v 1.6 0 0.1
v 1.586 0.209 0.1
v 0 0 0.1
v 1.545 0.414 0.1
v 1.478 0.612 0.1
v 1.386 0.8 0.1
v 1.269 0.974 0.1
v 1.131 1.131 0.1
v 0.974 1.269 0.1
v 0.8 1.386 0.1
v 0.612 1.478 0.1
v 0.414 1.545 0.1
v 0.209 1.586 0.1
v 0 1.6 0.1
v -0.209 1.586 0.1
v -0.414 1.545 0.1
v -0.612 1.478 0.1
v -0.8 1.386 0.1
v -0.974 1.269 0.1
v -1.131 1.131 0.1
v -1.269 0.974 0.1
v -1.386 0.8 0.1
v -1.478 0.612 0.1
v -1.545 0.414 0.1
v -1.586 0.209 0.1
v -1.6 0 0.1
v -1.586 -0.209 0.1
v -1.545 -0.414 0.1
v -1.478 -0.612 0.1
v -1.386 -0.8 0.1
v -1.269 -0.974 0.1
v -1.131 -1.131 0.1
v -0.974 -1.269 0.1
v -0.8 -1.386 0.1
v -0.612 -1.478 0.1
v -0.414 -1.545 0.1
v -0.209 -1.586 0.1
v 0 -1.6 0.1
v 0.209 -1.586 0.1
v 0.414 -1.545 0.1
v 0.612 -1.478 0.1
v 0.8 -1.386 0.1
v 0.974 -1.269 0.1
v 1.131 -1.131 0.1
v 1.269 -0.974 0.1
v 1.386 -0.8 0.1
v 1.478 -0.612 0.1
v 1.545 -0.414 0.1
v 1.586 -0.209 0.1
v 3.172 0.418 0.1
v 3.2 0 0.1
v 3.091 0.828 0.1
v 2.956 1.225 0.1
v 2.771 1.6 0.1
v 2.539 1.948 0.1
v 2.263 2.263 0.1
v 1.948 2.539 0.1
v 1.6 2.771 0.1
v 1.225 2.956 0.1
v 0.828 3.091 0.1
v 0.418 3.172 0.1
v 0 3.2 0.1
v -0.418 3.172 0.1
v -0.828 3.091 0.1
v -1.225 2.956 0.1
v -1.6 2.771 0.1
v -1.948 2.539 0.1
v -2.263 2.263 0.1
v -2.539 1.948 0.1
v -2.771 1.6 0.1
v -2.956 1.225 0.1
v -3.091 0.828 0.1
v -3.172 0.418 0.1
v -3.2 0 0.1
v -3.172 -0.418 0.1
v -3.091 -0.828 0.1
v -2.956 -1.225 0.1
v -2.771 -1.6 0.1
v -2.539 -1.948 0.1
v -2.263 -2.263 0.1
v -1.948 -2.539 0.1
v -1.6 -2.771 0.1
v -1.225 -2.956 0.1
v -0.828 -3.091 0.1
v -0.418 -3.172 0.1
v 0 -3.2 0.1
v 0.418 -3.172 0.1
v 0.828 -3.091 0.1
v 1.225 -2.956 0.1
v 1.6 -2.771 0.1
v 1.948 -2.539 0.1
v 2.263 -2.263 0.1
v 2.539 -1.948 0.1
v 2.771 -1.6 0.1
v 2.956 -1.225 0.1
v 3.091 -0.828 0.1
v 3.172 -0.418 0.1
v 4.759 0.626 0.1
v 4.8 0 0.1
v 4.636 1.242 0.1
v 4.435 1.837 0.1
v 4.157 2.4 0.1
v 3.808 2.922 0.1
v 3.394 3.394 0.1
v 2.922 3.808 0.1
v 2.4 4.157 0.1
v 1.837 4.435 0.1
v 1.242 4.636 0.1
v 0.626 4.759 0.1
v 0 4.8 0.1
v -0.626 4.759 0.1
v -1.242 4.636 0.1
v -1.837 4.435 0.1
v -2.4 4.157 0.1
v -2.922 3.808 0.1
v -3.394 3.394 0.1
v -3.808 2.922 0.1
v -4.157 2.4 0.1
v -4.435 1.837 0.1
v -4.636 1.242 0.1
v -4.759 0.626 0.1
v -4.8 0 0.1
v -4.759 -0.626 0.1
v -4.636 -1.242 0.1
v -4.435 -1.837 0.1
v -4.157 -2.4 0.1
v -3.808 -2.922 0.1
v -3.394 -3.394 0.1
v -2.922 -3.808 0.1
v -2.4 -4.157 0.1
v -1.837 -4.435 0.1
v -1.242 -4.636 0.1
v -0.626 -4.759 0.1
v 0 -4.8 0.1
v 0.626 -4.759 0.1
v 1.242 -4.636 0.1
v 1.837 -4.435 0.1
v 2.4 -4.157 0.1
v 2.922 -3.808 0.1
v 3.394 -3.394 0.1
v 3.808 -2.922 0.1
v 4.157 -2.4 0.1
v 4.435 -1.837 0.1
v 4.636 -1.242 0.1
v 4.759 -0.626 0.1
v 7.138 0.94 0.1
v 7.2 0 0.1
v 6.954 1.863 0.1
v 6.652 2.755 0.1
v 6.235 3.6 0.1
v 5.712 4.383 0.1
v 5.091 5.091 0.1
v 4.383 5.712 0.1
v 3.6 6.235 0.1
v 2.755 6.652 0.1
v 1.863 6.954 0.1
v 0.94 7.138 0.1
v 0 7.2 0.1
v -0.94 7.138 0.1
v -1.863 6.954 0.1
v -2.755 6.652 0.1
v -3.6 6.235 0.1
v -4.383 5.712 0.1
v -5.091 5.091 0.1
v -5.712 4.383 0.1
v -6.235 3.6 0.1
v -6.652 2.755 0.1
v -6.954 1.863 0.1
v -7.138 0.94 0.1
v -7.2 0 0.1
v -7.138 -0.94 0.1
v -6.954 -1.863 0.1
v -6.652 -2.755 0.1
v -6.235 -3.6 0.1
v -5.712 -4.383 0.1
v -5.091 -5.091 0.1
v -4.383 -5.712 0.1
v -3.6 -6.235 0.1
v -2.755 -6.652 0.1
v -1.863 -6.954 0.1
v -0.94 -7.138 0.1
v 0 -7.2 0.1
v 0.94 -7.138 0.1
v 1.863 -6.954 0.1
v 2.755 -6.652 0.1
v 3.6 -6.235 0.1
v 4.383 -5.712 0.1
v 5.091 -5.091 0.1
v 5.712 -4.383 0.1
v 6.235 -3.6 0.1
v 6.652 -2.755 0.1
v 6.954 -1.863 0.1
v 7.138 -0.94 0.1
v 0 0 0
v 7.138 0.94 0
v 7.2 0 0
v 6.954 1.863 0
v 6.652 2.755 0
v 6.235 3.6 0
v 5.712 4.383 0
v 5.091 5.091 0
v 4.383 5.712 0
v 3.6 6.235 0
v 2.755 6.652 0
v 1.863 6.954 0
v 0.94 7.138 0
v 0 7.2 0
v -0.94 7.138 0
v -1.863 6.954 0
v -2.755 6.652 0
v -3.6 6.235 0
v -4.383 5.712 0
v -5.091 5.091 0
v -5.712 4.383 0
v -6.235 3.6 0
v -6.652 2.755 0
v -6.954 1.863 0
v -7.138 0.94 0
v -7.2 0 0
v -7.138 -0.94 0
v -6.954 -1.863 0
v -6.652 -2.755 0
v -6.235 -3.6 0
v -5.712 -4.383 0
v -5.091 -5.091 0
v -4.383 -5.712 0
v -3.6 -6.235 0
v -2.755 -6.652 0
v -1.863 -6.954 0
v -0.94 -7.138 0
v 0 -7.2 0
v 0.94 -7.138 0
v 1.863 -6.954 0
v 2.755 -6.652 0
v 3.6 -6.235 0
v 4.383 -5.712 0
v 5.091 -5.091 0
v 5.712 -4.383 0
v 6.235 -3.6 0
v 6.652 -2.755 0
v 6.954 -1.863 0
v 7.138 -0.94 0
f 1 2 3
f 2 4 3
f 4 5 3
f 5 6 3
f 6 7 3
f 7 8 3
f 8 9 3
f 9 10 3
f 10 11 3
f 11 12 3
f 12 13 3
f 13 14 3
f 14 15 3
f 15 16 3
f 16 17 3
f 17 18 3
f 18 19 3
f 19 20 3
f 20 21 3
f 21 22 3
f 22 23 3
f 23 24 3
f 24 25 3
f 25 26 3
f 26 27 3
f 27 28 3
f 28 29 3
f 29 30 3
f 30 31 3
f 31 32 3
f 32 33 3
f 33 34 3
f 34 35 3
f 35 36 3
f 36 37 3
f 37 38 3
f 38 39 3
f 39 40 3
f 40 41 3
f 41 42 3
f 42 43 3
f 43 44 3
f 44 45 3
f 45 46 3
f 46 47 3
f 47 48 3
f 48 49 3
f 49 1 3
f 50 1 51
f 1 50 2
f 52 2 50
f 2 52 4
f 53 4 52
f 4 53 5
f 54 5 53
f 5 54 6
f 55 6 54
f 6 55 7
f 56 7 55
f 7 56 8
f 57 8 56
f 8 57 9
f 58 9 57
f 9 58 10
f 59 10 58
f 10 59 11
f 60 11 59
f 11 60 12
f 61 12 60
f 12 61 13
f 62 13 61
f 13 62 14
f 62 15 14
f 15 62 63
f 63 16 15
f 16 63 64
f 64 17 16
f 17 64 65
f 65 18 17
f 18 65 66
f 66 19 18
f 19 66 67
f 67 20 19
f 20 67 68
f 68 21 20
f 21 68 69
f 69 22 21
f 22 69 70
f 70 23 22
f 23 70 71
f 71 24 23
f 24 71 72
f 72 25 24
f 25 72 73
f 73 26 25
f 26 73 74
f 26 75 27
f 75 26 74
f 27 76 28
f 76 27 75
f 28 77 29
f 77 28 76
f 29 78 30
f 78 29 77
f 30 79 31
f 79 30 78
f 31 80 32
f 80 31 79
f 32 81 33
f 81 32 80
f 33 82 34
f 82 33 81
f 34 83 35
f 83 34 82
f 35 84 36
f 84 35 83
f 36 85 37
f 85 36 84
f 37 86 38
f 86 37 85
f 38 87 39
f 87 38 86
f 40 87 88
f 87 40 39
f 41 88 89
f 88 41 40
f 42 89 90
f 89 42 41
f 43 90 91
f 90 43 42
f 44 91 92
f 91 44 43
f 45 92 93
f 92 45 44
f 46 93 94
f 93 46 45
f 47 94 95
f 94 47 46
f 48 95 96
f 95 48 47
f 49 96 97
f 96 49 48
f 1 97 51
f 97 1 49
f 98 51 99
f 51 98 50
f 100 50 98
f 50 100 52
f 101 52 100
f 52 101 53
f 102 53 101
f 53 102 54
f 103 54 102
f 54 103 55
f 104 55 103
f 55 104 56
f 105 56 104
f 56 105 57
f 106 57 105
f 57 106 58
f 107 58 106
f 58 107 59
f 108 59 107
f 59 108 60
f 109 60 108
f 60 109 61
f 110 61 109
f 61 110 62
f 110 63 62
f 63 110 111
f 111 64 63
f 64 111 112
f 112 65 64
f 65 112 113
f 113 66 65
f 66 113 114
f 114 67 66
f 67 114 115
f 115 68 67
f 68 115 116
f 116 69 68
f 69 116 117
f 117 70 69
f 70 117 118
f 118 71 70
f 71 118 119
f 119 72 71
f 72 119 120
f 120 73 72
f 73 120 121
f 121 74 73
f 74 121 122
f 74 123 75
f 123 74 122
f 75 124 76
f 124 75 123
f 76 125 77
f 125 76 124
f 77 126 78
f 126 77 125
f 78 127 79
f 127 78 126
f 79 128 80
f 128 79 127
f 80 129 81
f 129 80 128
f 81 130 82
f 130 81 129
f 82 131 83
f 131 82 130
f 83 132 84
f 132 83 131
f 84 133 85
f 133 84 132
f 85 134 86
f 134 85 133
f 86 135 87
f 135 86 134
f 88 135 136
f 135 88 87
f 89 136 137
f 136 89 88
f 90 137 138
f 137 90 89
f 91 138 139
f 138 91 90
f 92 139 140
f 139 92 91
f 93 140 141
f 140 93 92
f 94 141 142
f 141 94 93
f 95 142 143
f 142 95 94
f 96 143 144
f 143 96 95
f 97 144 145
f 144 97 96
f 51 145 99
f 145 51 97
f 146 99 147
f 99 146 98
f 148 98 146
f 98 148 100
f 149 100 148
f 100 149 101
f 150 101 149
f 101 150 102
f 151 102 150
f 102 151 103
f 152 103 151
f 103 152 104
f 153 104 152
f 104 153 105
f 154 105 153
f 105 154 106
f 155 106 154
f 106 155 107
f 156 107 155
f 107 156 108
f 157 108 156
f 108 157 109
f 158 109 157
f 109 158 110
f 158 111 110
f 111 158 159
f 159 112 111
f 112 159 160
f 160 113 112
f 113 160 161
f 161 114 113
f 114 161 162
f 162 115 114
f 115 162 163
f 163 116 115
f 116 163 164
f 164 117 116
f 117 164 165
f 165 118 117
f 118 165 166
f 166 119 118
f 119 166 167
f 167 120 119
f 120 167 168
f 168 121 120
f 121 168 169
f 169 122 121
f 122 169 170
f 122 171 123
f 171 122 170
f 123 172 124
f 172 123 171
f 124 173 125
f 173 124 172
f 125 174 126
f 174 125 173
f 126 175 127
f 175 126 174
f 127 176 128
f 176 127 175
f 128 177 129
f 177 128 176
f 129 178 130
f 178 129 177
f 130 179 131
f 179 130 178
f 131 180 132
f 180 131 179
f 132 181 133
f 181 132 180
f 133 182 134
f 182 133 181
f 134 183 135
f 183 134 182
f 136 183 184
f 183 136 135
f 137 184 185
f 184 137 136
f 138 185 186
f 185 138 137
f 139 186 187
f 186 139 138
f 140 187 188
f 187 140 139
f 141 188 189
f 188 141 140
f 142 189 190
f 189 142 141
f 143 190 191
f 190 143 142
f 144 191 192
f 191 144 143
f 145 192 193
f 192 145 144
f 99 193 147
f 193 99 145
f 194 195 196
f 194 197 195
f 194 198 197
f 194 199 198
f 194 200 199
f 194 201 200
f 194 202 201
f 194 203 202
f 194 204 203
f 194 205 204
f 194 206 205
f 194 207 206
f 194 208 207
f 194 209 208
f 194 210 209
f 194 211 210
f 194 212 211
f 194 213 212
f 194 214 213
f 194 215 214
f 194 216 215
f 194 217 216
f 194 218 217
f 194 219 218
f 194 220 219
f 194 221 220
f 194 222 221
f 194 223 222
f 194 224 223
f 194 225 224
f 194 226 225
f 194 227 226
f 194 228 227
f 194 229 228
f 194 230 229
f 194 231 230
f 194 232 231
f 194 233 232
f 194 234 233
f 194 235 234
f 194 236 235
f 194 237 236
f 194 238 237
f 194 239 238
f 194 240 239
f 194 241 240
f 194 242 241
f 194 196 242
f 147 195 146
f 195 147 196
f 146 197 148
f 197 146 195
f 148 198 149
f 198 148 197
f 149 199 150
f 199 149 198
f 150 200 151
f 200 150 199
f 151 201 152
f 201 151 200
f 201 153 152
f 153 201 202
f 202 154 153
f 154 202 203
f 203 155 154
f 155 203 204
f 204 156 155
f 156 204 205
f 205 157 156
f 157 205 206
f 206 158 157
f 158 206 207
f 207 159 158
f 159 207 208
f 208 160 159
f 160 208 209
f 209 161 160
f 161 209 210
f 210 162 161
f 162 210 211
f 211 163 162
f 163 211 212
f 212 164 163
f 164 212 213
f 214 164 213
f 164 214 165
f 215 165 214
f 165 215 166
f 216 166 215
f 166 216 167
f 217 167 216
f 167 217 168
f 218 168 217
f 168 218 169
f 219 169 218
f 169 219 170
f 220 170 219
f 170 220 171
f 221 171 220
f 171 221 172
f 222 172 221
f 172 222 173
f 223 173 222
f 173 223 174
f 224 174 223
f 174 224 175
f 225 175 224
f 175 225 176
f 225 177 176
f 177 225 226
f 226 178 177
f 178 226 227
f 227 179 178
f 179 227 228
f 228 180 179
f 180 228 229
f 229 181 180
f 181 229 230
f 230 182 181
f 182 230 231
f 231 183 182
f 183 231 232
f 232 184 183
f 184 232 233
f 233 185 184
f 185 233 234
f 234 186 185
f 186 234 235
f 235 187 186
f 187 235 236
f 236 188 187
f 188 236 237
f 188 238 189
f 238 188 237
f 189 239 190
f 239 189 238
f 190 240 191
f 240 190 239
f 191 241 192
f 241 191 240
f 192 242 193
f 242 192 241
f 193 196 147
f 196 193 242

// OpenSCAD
// file: ../p/48/1-4cyli.scad
use <../../lib.scad>
function ldraw_lib__48__1_4cyli() = [
// 0 Hi-Res Cylinder 0.25
// 0 Name: 48\1-4cyli.dat
// 0 Author: Manfred Moolhuysen
// 0 !LDRAW_ORG 48_Primitive UPDATE 2009-01
// 0 !LICENSE Licensed under CC BY 2.0 and CC BY 4.0 : see CAreadme.txt
// 
// 0 BFC CERTIFY CCW
  [0,"BFC","CERTIFY"],
  [0,"BFC","CCW"],
// 
// 0 !HISTORY 1999-07-05 [PTadmin] Official Update 1999-05
// 0 !HISTORY 2002-02-28 [hafhead] Added BFC statement
// 0 !HISTORY 2002-04-25 [PTadmin] Official Update 2002-02
// 0 !HISTORY 2007-06-24 [PTadmin] Header formatted for Contributor Agreement
// 0 !HISTORY 2008-07-01 [PTadmin] Official Update 2008-01
// 0 !HISTORY 2008-07-07 [guyvivan] Made BFC'ed CCW (2005-12-06)
// 0 !HISTORY 2009-05-02 [PTadmin] Official Update 2009-01
// 
// 
// 4 16 0.9914 0 0.1305 1 0 0 1 1 0 0.9914 1 0.1305
  [4,16,0.9914,0,0.1305,1,0,0,1,1,0,0.9914,1,0.1305],
// 4 16 0.9659 0 0.2588 0.9914 0 0.1305 0.9914 1 0.1305 0.9659 1 0.2588
  [4,16,0.9659,0,0.2588,0.9914,0,0.1305,0.9914,1,0.1305,0.9659,1,0.2588],
// 4 16 0.9239 0 0.3827 0.9659 0 0.2588 0.9659 1 0.2588 0.9239 1 0.3827
  [4,16,0.9239,0,0.3827,0.9659,0,0.2588,0.9659,1,0.2588,0.9239,1,0.3827],
// 4 16 0.866 0 0.5 0.9239 0 0.3827 0.9239 1 0.3827 0.866 1 0.5
  [4,16,0.866,0,0.5,0.9239,0,0.3827,0.9239,1,0.3827,0.866,1,0.5],
// 4 16 0.7934 0 0.6088 0.866 0 0.5 0.866 1 0.5 0.7934 1 0.6088
  [4,16,0.7934,0,0.6088,0.866,0,0.5,0.866,1,0.5,0.7934,1,0.6088],
// 4 16 0.7071 0 0.7071 0.7934 0 0.6088 0.7934 1 0.6088 0.7071 1 0.7071
  [4,16,0.7071,0,0.7071,0.7934,0,0.6088,0.7934,1,0.6088,0.7071,1,0.7071],
// 4 16 0.6088 0 0.7934 0.7071 0 0.7071 0.7071 1 0.7071 0.6088 1 0.7934
  [4,16,0.6088,0,0.7934,0.7071,0,0.7071,0.7071,1,0.7071,0.6088,1,0.7934],
// 4 16 0.5 0 0.866 0.6088 0 0.7934 0.6088 1 0.7934 0.5 1 0.866
  [4,16,0.5,0,0.866,0.6088,0,0.7934,0.6088,1,0.7934,0.5,1,0.866],
// 4 16 0.3827 0 0.9239 0.5 0 0.866 0.5 1 0.866 0.3827 1 0.9239
  [4,16,0.3827,0,0.9239,0.5,0,0.866,0.5,1,0.866,0.3827,1,0.9239],
// 4 16 0.2588 0 0.9659 0.3827 0 0.9239 0.3827 1 0.9239 0.2588 1 0.9659
  [4,16,0.2588,0,0.9659,0.3827,0,0.9239,0.3827,1,0.9239,0.2588,1,0.9659],
// 4 16 0.1305 0 0.9914 0.2588 0 0.9659 0.2588 1 0.9659 0.1305 1 0.9914
  [4,16,0.1305,0,0.9914,0.2588,0,0.9659,0.2588,1,0.9659,0.1305,1,0.9914],
// 4 16 0 0 1 0.1305 0 0.9914 0.1305 1 0.9914 0 1 1
  [4,16,0,0,1,0.1305,0,0.9914,0.1305,1,0.9914,0,1,1],
// 
// 0 conditional lines
// 5 24 1 1 0 1 0 0 1 1 -1 0.9914 1 0.1305
  [5,24,1,1,0,1,0,0,1,1,-1,0.9914,1,0.1305],
// 5 24 0.9914 1 0.1305 0.9914 0 0.1305 1 1 0 0.9659 1 0.2588
  [5,24,0.9914,1,0.1305,0.9914,0,0.1305,1,1,0,0.9659,1,0.2588],
// 5 24 0.9659 1 0.2588 0.9659 0 0.2588 0.9914 1 0.1305 0.9239 1 0.3827
  [5,24,0.9659,1,0.2588,0.9659,0,0.2588,0.9914,1,0.1305,0.9239,1,0.3827],
// 5 24 0.9239 1 0.3827 0.9239 0 0.3827 0.9659 1 0.2588 0.866 1 0.5
  [5,24,0.9239,1,0.3827,0.9239,0,0.3827,0.9659,1,0.2588,0.866,1,0.5],
// 5 24 0.866 1 0.5 0.866 0 0.5 0.9239 1 0.3827 0.7934 1 0.6088
  [5,24,0.866,1,0.5,0.866,0,0.5,0.9239,1,0.3827,0.7934,1,0.6088],
// 5 24 0.7934 1 0.6088 0.7934 0 0.6088 0.866 1 0.5 0.7071 1 0.7071
  [5,24,0.7934,1,0.6088,0.7934,0,0.6088,0.866,1,0.5,0.7071,1,0.7071],
// 5 24 0.7071 1 0.7071 0.7071 0 0.7071 0.7934 1 0.6088 0.6088 1 0.7934
  [5,24,0.7071,1,0.7071,0.7071,0,0.7071,0.7934,1,0.6088,0.6088,1,0.7934],
// 5 24 0.6088 1 0.7934 0.6088 0 0.7934 0.7071 1 0.7071 0.5 1 0.866
  [5,24,0.6088,1,0.7934,0.6088,0,0.7934,0.7071,1,0.7071,0.5,1,0.866],
// 5 24 0.5 1 0.866 0.5 0 0.866 0.6088 1 0.7934 0.3827 1 0.9239
  [5,24,0.5,1,0.866,0.5,0,0.866,0.6088,1,0.7934,0.3827,1,0.9239],
// 5 24 0.3827 1 0.9239 0.3827 0 0.9239 0.5 1 0.866 0.2588 1 0.9659
  [5,24,0.3827,1,0.9239,0.3827,0,0.9239,0.5,1,0.866,0.2588,1,0.9659],
// 5 24 0.2588 1 0.9659 0.2588 0 0.9659 0.3827 1 0.9239 0.1305 1 0.9914
  [5,24,0.2588,1,0.9659,0.2588,0,0.9659,0.3827,1,0.9239,0.1305,1,0.9914],
// 5 24 0.1305 1 0.9914 0.1305 0 0.9914 0.2588 1 0.9659 0 1 1
  [5,24,0.1305,1,0.9914,0.1305,0,0.9914,0.2588,1,0.9659,0,1,1],
// 5 24 0 1 1 0 0 1 0.1305 1 0.9914 -1 1 1
  [5,24,0,1,1,0,0,1,0.1305,1,0.9914,-1,1,1],
// 
// 0 end of file
];
module ldraw_lib__48__1_4cyli(step=0, col=false, unit=2/5, alt=false, line=0.2, solid=!$preview)
    makepoly(ldraw_lib__48__1_4cyli(), step=step, col=col, unit=unit, alt=alt, line=line, solid=solid);
ldraw_lib__48__1_4cyli(line=0.2);
// file: ../p/48/4-4cyli.scad
use <../../lib.scad>
use <1-4cyli.scad>
function ldraw_lib__48__4_4cyli() = [
// 0 Hi-Res Cylinder 1.0
// 0 Name: 48\4-4cyli.dat
// 0 Author: Paul Easter [pneaster]
// 0 !LDRAW_ORG 48_Primitive UPDATE 2012-02
// 0 !LICENSE Licensed under CC BY 4.0 : see CAreadme.txt
// 
// 0 BFC CERTIFY CCW
  [0,"BFC","CERTIFY"],
  [0,"BFC","CCW"],
// 
// 0 !HISTORY 2002-08-18 [PTadmin] Official Update 2002-04
// 0 !HISTORY 2007-06-24 [PTadmin] Header formatted for Contributor Agreement
// 0 !HISTORY 2008-07-01 [PTadmin] Official Update 2008-01
// 0 !HISTORY 2012-02-27 [Philo] Changed to CCW
// 0 !HISTORY 2012-08-09 [PTadmin] Official Update 2012-02
// 
// 
// 1 16 0 0 0 1 0 0 0 1 0 0 0 1 48\1-4cyli.dat
  [1,16,0,0,0,1,0,0,0,1,0,0,0,1, ldraw_lib__48__1_4cyli()],
// 1 16 0 0 0 0 0 -1 0 1 0 1 0 0 48\1-4cyli.dat
  [1,16,0,0,0,0,0,-1,0,1,0,1,0,0, ldraw_lib__48__1_4cyli()],
// 1 16 0 0 0 -1 0 0 0 1 0 0 0 -1 48\1-4cyli.dat
  [1,16,0,0,0,-1,0,0,0,1,0,0,0,-1, ldraw_lib__48__1_4cyli()],
// 1 16 0 0 0 0 0 1 0 1 0 -1 0 0 48\1-4cyli.dat
  [1,16,0,0,0,0,0,1,0,1,0,-1,0,0, ldraw_lib__48__1_4cyli()],
];
module ldraw_lib__48__4_4cyli(step=0, col=false, unit=2/5, alt=false, line=0.2, solid=!$preview)
    makepoly(ldraw_lib__48__4_4cyli(), step=step, col=col, unit=unit, alt=alt, line=line, solid=solid);
ldraw_lib__48__4_4cyli(line=0.2);
// file: ../p/48/4-4ring2.scad
use <../../lib.scad>
function ldraw_lib__48__4_4ring2() = [
// 0 Hi-Res Ring  2 x 1.0
// 0 Name: 48\4-4ring2.dat
// 0 Author: Niels Bugge [SirBugge]
// 0 !LDRAW_ORG 48_Primitive UPDATE 2012-02
// 0 !LICENSE Licensed under CC BY 2.0 and CC BY 4.0 : see CAreadme.txt
// 
// 0 BFC CERTIFY CCW
  [0,"BFC","CERTIFY"],
  [0,"BFC","CCW"],
// 
// 0 !HISTORY 2009-05-02 [PTadmin] Official Update 2009-01
// 0 !HISTORY 2012-02-27 [Philo] Changed to CCW
// 0 !HISTORY 2012-08-09 [PTadmin] Official Update 2012-02
// 
// 
// 4 16 3 0 0 2.9742 0 0.3915 1.9828 0 0.261 2 0 0
  [4,16,3,0,0,2.9742,0,0.3915,1.9828,0,0.261,2,0,0],
// 4 16 2.9742 0 0.3915 2.8977 0 0.7764 1.9318 0 0.5176 1.9828 0 0.261
  [4,16,2.9742,0,0.3915,2.8977,0,0.7764,1.9318,0,0.5176,1.9828,0,0.261],
// 4 16 2.8977 0 0.7764 2.7717 0 1.1481 1.8478 0 0.7654 1.9318 0 0.5176
  [4,16,2.8977,0,0.7764,2.7717,0,1.1481,1.8478,0,0.7654,1.9318,0,0.5176],
// 4 16 2.7717 0 1.1481 2.598 0 1.5 1.732 0 1 1.8478 0 0.7654
  [4,16,2.7717,0,1.1481,2.598,0,1.5,1.732,0,1,1.8478,0,0.7654],
// 4 16 2.598 0 1.5 2.3802 0 1.8264 1.5868 0 1.2176 1.732 0 1
  [4,16,2.598,0,1.5,2.3802,0,1.8264,1.5868,0,1.2176,1.732,0,1],
// 4 16 2.3802 0 1.8264 2.1213 0 2.1213 1.4142 0 1.4142 1.5868 0 1.2176
  [4,16,2.3802,0,1.8264,2.1213,0,2.1213,1.4142,0,1.4142,1.5868,0,1.2176],
// 4 16 2.1213 0 2.1213 1.8264 0 2.3802 1.2176 0 1.5868 1.4142 0 1.4142
  [4,16,2.1213,0,2.1213,1.8264,0,2.3802,1.2176,0,1.5868,1.4142,0,1.4142],
// 4 16 1.8264 0 2.3802 1.5 0 2.598 1 0 1.732 1.2176 0 1.5868
  [4,16,1.8264,0,2.3802,1.5,0,2.598,1,0,1.732,1.2176,0,1.5868],
// 4 16 1.5 0 2.598 1.1481 0 2.7717 0.7654 0 1.8478 1 0 1.732
  [4,16,1.5,0,2.598,1.1481,0,2.7717,0.7654,0,1.8478,1,0,1.732],
// 4 16 1.1481 0 2.7717 0.7764 0 2.8977 0.5176 0 1.9318 0.7654 0 1.8478
  [4,16,1.1481,0,2.7717,0.7764,0,2.8977,0.5176,0,1.9318,0.7654,0,1.8478],
// 4 16 0.7764 0 2.8977 0.3915 0 2.9742 0.261 0 1.9828 0.5176 0 1.9318
  [4,16,0.7764,0,2.8977,0.3915,0,2.9742,0.261,0,1.9828,0.5176,0,1.9318],
// 4 16 0.3915 0 2.9742 0 0 3 0 0 2 0.261 0 1.9828
  [4,16,0.3915,0,2.9742,0,0,3,0,0,2,0.261,0,1.9828],
// 4 16 0 0 3 -0.3915 0 2.9742 -0.261 0 1.9828 0 0 2
  [4,16,0,0,3,-0.3915,0,2.9742,-0.261,0,1.9828,0,0,2],
// 4 16 -0.3915 0 2.9742 -0.7764 0 2.8977 -0.5176 0 1.9318 -0.261 0 1.9828
  [4,16,-0.3915,0,2.9742,-0.7764,0,2.8977,-0.5176,0,1.9318,-0.261,0,1.9828],
// 4 16 -0.7764 0 2.8977 -1.1481 0 2.7717 -0.7654 0 1.8478 -0.5176 0 1.9318
  [4,16,-0.7764,0,2.8977,-1.1481,0,2.7717,-0.7654,0,1.8478,-0.5176,0,1.9318],
// 4 16 -1.1481 0 2.7717 -1.5 0 2.598 -1 0 1.732 -0.7654 0 1.8478
  [4,16,-1.1481,0,2.7717,-1.5,0,2.598,-1,0,1.732,-0.7654,0,1.8478],
// 4 16 -1.5 0 2.598 -1.8264 0 2.3802 -1.2176 0 1.5868 -1 0 1.732
  [4,16,-1.5,0,2.598,-1.8264,0,2.3802,-1.2176,0,1.5868,-1,0,1.732],
// 4 16 -1.8264 0 2.3802 -2.1213 0 2.1213 -1.4142 0 1.4142 -1.2176 0 1.5868
  [4,16,-1.8264,0,2.3802,-2.1213,0,2.1213,-1.4142,0,1.4142,-1.2176,0,1.5868],
// 4 16 -2.1213 0 2.1213 -2.3802 0 1.8264 -1.5868 0 1.2176 -1.4142 0 1.4142
  [4,16,-2.1213,0,2.1213,-2.3802,0,1.8264,-1.5868,0,1.2176,-1.4142,0,1.4142],
// 4 16 -2.3802 0 1.8264 -2.598 0 1.5 -1.732 0 1 -1.5868 0 1.2176
  [4,16,-2.3802,0,1.8264,-2.598,0,1.5,-1.732,0,1,-1.5868,0,1.2176],
// 4 16 -2.598 0 1.5 -2.7717 0 1.1481 -1.8478 0 0.7654 -1.732 0 1
  [4,16,-2.598,0,1.5,-2.7717,0,1.1481,-1.8478,0,0.7654,-1.732,0,1],
// 4 16 -2.7717 0 1.1481 -2.8977 0 0.7764 -1.9318 0 0.5176 -1.8478 0 0.7654
  [4,16,-2.7717,0,1.1481,-2.8977,0,0.7764,-1.9318,0,0.5176,-1.8478,0,0.7654],
// 4 16 -2.8977 0 0.7764 -2.9742 0 0.3915 -1.9828 0 0.261 -1.9318 0 0.5176
  [4,16,-2.8977,0,0.7764,-2.9742,0,0.3915,-1.9828,0,0.261,-1.9318,0,0.5176],
// 4 16 -2.9742 0 0.3915 -3 0 0 -2 0 0 -1.9828 0 0.261
  [4,16,-2.9742,0,0.3915,-3,0,0,-2,0,0,-1.9828,0,0.261],
// 4 16 -3 0 0 -2.9742 0 -0.3915 -1.9828 0 -0.261 -2 0 0
  [4,16,-3,0,0,-2.9742,0,-0.3915,-1.9828,0,-0.261,-2,0,0],
// 4 16 -2.9742 0 -0.3915 -2.8977 0 -0.7764 -1.9318 0 -0.5176 -1.9828 0 -0.261
  [4,16,-2.9742,0,-0.3915,-2.8977,0,-0.7764,-1.9318,0,-0.5176,-1.9828,0,-0.261],
// 4 16 -2.8977 0 -0.7764 -2.7717 0 -1.1481 -1.8478 0 -0.7654 -1.9318 0 -0.5176
  [4,16,-2.8977,0,-0.7764,-2.7717,0,-1.1481,-1.8478,0,-0.7654,-1.9318,0,-0.5176],
// 4 16 -2.7717 0 -1.1481 -2.598 0 -1.5 -1.732 0 -1 -1.8478 0 -0.7654
  [4,16,-2.7717,0,-1.1481,-2.598,0,-1.5,-1.732,0,-1,-1.8478,0,-0.7654],
// 4 16 -2.598 0 -1.5 -2.3802 0 -1.8264 -1.5868 0 -1.2176 -1.732 0 -1
  [4,16,-2.598,0,-1.5,-2.3802,0,-1.8264,-1.5868,0,-1.2176,-1.732,0,-1],
// 4 16 -2.3802 0 -1.8264 -2.1213 0 -2.1213 -1.4142 0 -1.4142 -1.5868 0 -1.2176
  [4,16,-2.3802,0,-1.8264,-2.1213,0,-2.1213,-1.4142,0,-1.4142,-1.5868,0,-1.2176],
// 4 16 -2.1213 0 -2.1213 -1.8264 0 -2.3802 -1.2176 0 -1.5868 -1.4142 0 -1.4142
  [4,16,-2.1213,0,-2.1213,-1.8264,0,-2.3802,-1.2176,0,-1.5868,-1.4142,0,-1.4142],
// 4 16 -1.8264 0 -2.3802 -1.5 0 -2.598 -1 0 -1.732 -1.2176 0 -1.5868
  [4,16,-1.8264,0,-2.3802,-1.5,0,-2.598,-1,0,-1.732,-1.2176,0,-1.5868],
// 4 16 -1.5 0 -2.598 -1.1481 0 -2.7717 -0.7654 0 -1.8478 -1 0 -1.732
  [4,16,-1.5,0,-2.598,-1.1481,0,-2.7717,-0.7654,0,-1.8478,-1,0,-1.732],
// 4 16 -1.1481 0 -2.7717 -0.7764 0 -2.8977 -0.5176 0 -1.9318 -0.7654 0 -1.8478
  [4,16,-1.1481,0,-2.7717,-0.7764,0,-2.8977,-0.5176,0,-1.9318,-0.7654,0,-1.8478],
// 4 16 -0.7764 0 -2.8977 -0.3915 0 -2.9742 -0.261 0 -1.9828 -0.5176 0 -1.9318
  [4,16,-0.7764,0,-2.8977,-0.3915,0,-2.9742,-0.261,0,-1.9828,-0.5176,0,-1.9318],
// 4 16 -0.3915 0 -2.9742 0 0 -3 0 0 -2 -0.261 0 -1.9828
  [4,16,-0.3915,0,-2.9742,0,0,-3,0,0,-2,-0.261,0,-1.9828],
// 4 16 0 0 -3 0.3915 0 -2.9742 0.261 0 -1.9828 0 0 -2
  [4,16,0,0,-3,0.3915,0,-2.9742,0.261,0,-1.9828,0,0,-2],
// 4 16 0.3915 0 -2.9742 0.7764 0 -2.8977 0.5176 0 -1.9318 0.261 0 -1.9828
  [4,16,0.3915,0,-2.9742,0.7764,0,-2.8977,0.5176,0,-1.9318,0.261,0,-1.9828],
// 4 16 0.7764 0 -2.8977 1.1481 0 -2.7717 0.7654 0 -1.8478 0.5176 0 -1.9318
  [4,16,0.7764,0,-2.8977,1.1481,0,-2.7717,0.7654,0,-1.8478,0.5176,0,-1.9318],
// 4 16 1.1481 0 -2.7717 1.5 0 -2.598 1 0 -1.732 0.7654 0 -1.8478
  [4,16,1.1481,0,-2.7717,1.5,0,-2.598,1,0,-1.732,0.7654,0,-1.8478],
// 4 16 1.5 0 -2.598 1.8264 0 -2.3802 1.2176 0 -1.5868 1 0 -1.732
  [4,16,1.5,0,-2.598,1.8264,0,-2.3802,1.2176,0,-1.5868,1,0,-1.732],
// 4 16 1.8264 0 -2.3802 2.1213 0 -2.1213 1.4142 0 -1.4142 1.2176 0 -1.5868
  [4,16,1.8264,0,-2.3802,2.1213,0,-2.1213,1.4142,0,-1.4142,1.2176,0,-1.5868],
// 4 16 2.1213 0 -2.1213 2.3802 0 -1.8264 1.5868 0 -1.2176 1.4142 0 -1.4142
  [4,16,2.1213,0,-2.1213,2.3802,0,-1.8264,1.5868,0,-1.2176,1.4142,0,-1.4142],
// 4 16 2.3802 0 -1.8264 2.598 0 -1.5 1.732 0 -1 1.5868 0 -1.2176
  [4,16,2.3802,0,-1.8264,2.598,0,-1.5,1.732,0,-1,1.5868,0,-1.2176],
// 4 16 2.598 0 -1.5 2.7717 0 -1.1481 1.8478 0 -0.7654 1.732 0 -1
  [4,16,2.598,0,-1.5,2.7717,0,-1.1481,1.8478,0,-0.7654,1.732,0,-1],
// 4 16 2.7717 0 -1.1481 2.8977 0 -0.7764 1.9318 0 -0.5176 1.8478 0 -0.7654
  [4,16,2.7717,0,-1.1481,2.8977,0,-0.7764,1.9318,0,-0.5176,1.8478,0,-0.7654],
// 4 16 2.8977 0 -0.7764 2.9742 0 -0.3915 1.9828 0 -0.261 1.9318 0 -0.5176
  [4,16,2.8977,0,-0.7764,2.9742,0,-0.3915,1.9828,0,-0.261,1.9318,0,-0.5176],
// 4 16 2.9742 0 -0.3915 3 0 0 2 0 0 1.9828 0 -0.261
  [4,16,2.9742,0,-0.3915,3,0,0,2,0,0,1.9828,0,-0.261],
];
module ldraw_lib__48__4_4ring2(step=0, col=false, unit=2/5, alt=false, line=0.2, solid=!$preview)
    makepoly(ldraw_lib__48__4_4ring2(), step=step, col=col, unit=unit, alt=alt, line=line, solid=solid);
ldraw_lib__48__4_4ring2(line=0.2);
// file: ../p/48/4-4ring1.scad
use <../../lib.scad>
function ldraw_lib__48__4_4ring1() = [
// 0 Hi-Res Ring  1 x 1.0
// 0 Name: 48\4-4ring1.dat
// 0 Author: Mark Kennedy [mkennedy]
// 0 !LDRAW_ORG 48_Primitive UPDATE 2012-02
// 0 !LICENSE Licensed under CC BY 4.0 : see CAreadme.txt
// 
// 0 BFC CERTIFY CCW
  [0,"BFC","CERTIFY"],
  [0,"BFC","CCW"],
// 
// 0 !HISTORY 2003-12-19 [PTadmin] Official Update 2003-03
// 0 !HISTORY 2007-06-24 [PTadmin] Header formatted for Contributor Agreement
// 0 !HISTORY 2008-07-01 [PTadmin] Official Update 2008-01
// 0 !HISTORY 2012-02-27 [Philo] Changed to CCW
// 0 !HISTORY 2012-08-09 [PTadmin] Official Update 2012-02
// 
// 
// 4 16 2 0 0 1.9828 0 0.261 0.9914 0 0.1305 1 0 0
  [4,16,2,0,0,1.9828,0,0.261,0.9914,0,0.1305,1,0,0],
// 4 16 1.9828 0 0.261 1.9318 0 0.5176 0.9659 0 0.2588 0.9914 0 0.1305
  [4,16,1.9828,0,0.261,1.9318,0,0.5176,0.9659,0,0.2588,0.9914,0,0.1305],
// 4 16 1.9318 0 0.5176 1.8478 0 0.7654 0.9239 0 0.3827 0.9659 0 0.2588
  [4,16,1.9318,0,0.5176,1.8478,0,0.7654,0.9239,0,0.3827,0.9659,0,0.2588],
// 4 16 1.8478 0 0.7654 1.732 0 1 0.866 0 0.5 0.9239 0 0.3827
  [4,16,1.8478,0,0.7654,1.732,0,1,0.866,0,0.5,0.9239,0,0.3827],
// 4 16 1.732 0 1 1.5868 0 1.2176 0.7934 0 0.6088 0.866 0 0.5
  [4,16,1.732,0,1,1.5868,0,1.2176,0.7934,0,0.6088,0.866,0,0.5],
// 4 16 1.5868 0 1.2176 1.4142 0 1.4142 0.7071 0 0.7071 0.7934 0 0.6088
  [4,16,1.5868,0,1.2176,1.4142,0,1.4142,0.7071,0,0.7071,0.7934,0,0.6088],
// 4 16 1.4142 0 1.4142 1.2176 0 1.5868 0.6088 0 0.7934 0.7071 0 0.7071
  [4,16,1.4142,0,1.4142,1.2176,0,1.5868,0.6088,0,0.7934,0.7071,0,0.7071],
// 4 16 1.2176 0 1.5868 1 0 1.732 0.5 0 0.866 0.6088 0 0.7934
  [4,16,1.2176,0,1.5868,1,0,1.732,0.5,0,0.866,0.6088,0,0.7934],
// 4 16 1 0 1.732 0.7654 0 1.8478 0.3827 0 0.9239 0.5 0 0.866
  [4,16,1,0,1.732,0.7654,0,1.8478,0.3827,0,0.9239,0.5,0,0.866],
// 4 16 0.7654 0 1.8478 0.5176 0 1.9318 0.2588 0 0.9659 0.3827 0 0.9239
  [4,16,0.7654,0,1.8478,0.5176,0,1.9318,0.2588,0,0.9659,0.3827,0,0.9239],
// 4 16 0.5176 0 1.9318 0.261 0 1.9828 0.1305 0 0.9914 0.2588 0 0.9659
  [4,16,0.5176,0,1.9318,0.261,0,1.9828,0.1305,0,0.9914,0.2588,0,0.9659],
// 4 16 0.261 0 1.9828 0 0 2 0 0 1 0.1305 0 0.9914
  [4,16,0.261,0,1.9828,0,0,2,0,0,1,0.1305,0,0.9914],
// 
// 4 16 0 0 2 -0.261 0 1.9828 -0.1305 0 0.9914 0 0 1
  [4,16,0,0,2,-0.261,0,1.9828,-0.1305,0,0.9914,0,0,1],
// 4 16 -0.261 0 1.9828 -0.5176 0 1.9318 -0.2588 0 0.9659 -0.1305 0 0.9914
  [4,16,-0.261,0,1.9828,-0.5176,0,1.9318,-0.2588,0,0.9659,-0.1305,0,0.9914],
// 4 16 -0.5176 0 1.9318 -0.7654 0 1.8478 -0.3827 0 0.9239 -0.2588 0 0.9659
  [4,16,-0.5176,0,1.9318,-0.7654,0,1.8478,-0.3827,0,0.9239,-0.2588,0,0.9659],
// 4 16 -0.7654 0 1.8478 -1 0 1.732 -0.5 0 0.866 -0.3827 0 0.9239
  [4,16,-0.7654,0,1.8478,-1,0,1.732,-0.5,0,0.866,-0.3827,0,0.9239],
// 4 16 -1 0 1.732 -1.2176 0 1.5868 -0.6088 0 0.7934 -0.5 0 0.866
  [4,16,-1,0,1.732,-1.2176,0,1.5868,-0.6088,0,0.7934,-0.5,0,0.866],
// 4 16 -1.2176 0 1.5868 -1.4142 0 1.4142 -0.7071 0 0.7071 -0.6088 0 0.7934
  [4,16,-1.2176,0,1.5868,-1.4142,0,1.4142,-0.7071,0,0.7071,-0.6088,0,0.7934],
// 4 16 -1.4142 0 1.4142 -1.5868 0 1.2176 -0.7934 0 0.6088 -0.7071 0 0.7071
  [4,16,-1.4142,0,1.4142,-1.5868,0,1.2176,-0.7934,0,0.6088,-0.7071,0,0.7071],
// 4 16 -1.5868 0 1.2176 -1.732 0 1 -0.866 0 0.5 -0.7934 0 0.6088
  [4,16,-1.5868,0,1.2176,-1.732,0,1,-0.866,0,0.5,-0.7934,0,0.6088],
// 4 16 -1.732 0 1 -1.8478 0 0.7654 -0.9239 0 0.3827 -0.866 0 0.5
  [4,16,-1.732,0,1,-1.8478,0,0.7654,-0.9239,0,0.3827,-0.866,0,0.5],
// 4 16 -1.8478 0 0.7654 -1.9318 0 0.5176 -0.9659 0 0.2588 -0.9239 0 0.3827
  [4,16,-1.8478,0,0.7654,-1.9318,0,0.5176,-0.9659,0,0.2588,-0.9239,0,0.3827],
// 4 16 -1.9318 0 0.5176 -1.9828 0 0.261 -0.9914 0 0.1305 -0.9659 0 0.2588
  [4,16,-1.9318,0,0.5176,-1.9828,0,0.261,-0.9914,0,0.1305,-0.9659,0,0.2588],
// 4 16 -1.9828 0 0.261 -2 0 0 -1 0 0 -0.9914 0 0.1305
  [4,16,-1.9828,0,0.261,-2,0,0,-1,0,0,-0.9914,0,0.1305],
// 
// 4 16 -2 0 0 -1.9828 0 -0.261 -0.9914 0 -0.1305 -1 0 0
  [4,16,-2,0,0,-1.9828,0,-0.261,-0.9914,0,-0.1305,-1,0,0],
// 4 16 -1.9828 0 -0.261 -1.9318 0 -0.5176 -0.9659 0 -0.2588 -0.9914 0 -0.1305
  [4,16,-1.9828,0,-0.261,-1.9318,0,-0.5176,-0.9659,0,-0.2588,-0.9914,0,-0.1305],
// 4 16 -1.9318 0 -0.5176 -1.8478 0 -0.7654 -0.9239 0 -0.3827 -0.9659 0 -0.2588
  [4,16,-1.9318,0,-0.5176,-1.8478,0,-0.7654,-0.9239,0,-0.3827,-0.9659,0,-0.2588],
// 4 16 -1.8478 0 -0.7654 -1.732 0 -1 -0.866 0 -0.5 -0.9239 0 -0.3827
  [4,16,-1.8478,0,-0.7654,-1.732,0,-1,-0.866,0,-0.5,-0.9239,0,-0.3827],
// 4 16 -1.732 0 -1 -1.5868 0 -1.2176 -0.7934 0 -0.6088 -0.866 0 -0.5
  [4,16,-1.732,0,-1,-1.5868,0,-1.2176,-0.7934,0,-0.6088,-0.866,0,-0.5],
// 4 16 -1.5868 0 -1.2176 -1.4142 0 -1.4142 -0.7071 0 -0.7071 -0.7934 0 -0.6088
  [4,16,-1.5868,0,-1.2176,-1.4142,0,-1.4142,-0.7071,0,-0.7071,-0.7934,0,-0.6088],
// 4 16 -1.4142 0 -1.4142 -1.2176 0 -1.5868 -0.6088 0 -0.7934 -0.7071 0 -0.7071
  [4,16,-1.4142,0,-1.4142,-1.2176,0,-1.5868,-0.6088,0,-0.7934,-0.7071,0,-0.7071],
// 4 16 -1.2176 0 -1.5868 -1 0 -1.732 -0.5 0 -0.866 -0.6088 0 -0.7934
  [4,16,-1.2176,0,-1.5868,-1,0,-1.732,-0.5,0,-0.866,-0.6088,0,-0.7934],
// 4 16 -1 0 -1.732 -0.7654 0 -1.8478 -0.3827 0 -0.9239 -0.5 0 -0.866
  [4,16,-1,0,-1.732,-0.7654,0,-1.8478,-0.3827,0,-0.9239,-0.5,0,-0.866],
// 4 16 -0.7654 0 -1.8478 -0.5176 0 -1.9318 -0.2588 0 -0.9659 -0.3827 0 -0.9239
  [4,16,-0.7654,0,-1.8478,-0.5176,0,-1.9318,-0.2588,0,-0.9659,-0.3827,0,-0.9239],
// 4 16 -0.5176 0 -1.9318 -0.261 0 -1.9828 -0.1305 0 -0.9914 -0.2588 0 -0.9659
  [4,16,-0.5176,0,-1.9318,-0.261,0,-1.9828,-0.1305,0,-0.9914,-0.2588,0,-0.9659],
// 4 16 -0.261 0 -1.9828 0 0 -2 0 0 -1 -0.1305 0 -0.9914
  [4,16,-0.261,0,-1.9828,0,0,-2,0,0,-1,-0.1305,0,-0.9914],
// 
// 4 16 0 0 -2 0.261 0 -1.9828 0.1305 0 -0.9914 0 0 -1
  [4,16,0,0,-2,0.261,0,-1.9828,0.1305,0,-0.9914,0,0,-1],
// 4 16 0.261 0 -1.9828 0.5176 0 -1.9318 0.2588 0 -0.9659 0.1305 0 -0.9914
  [4,16,0.261,0,-1.9828,0.5176,0,-1.9318,0.2588,0,-0.9659,0.1305,0,-0.9914],
// 4 16 0.5176 0 -1.9318 0.7654 0 -1.8478 0.3827 0 -0.9239 0.2588 0 -0.9659
  [4,16,0.5176,0,-1.9318,0.7654,0,-1.8478,0.3827,0,-0.9239,0.2588,0,-0.9659],
// 4 16 0.7654 0 -1.8478 1 0 -1.732 0.5 0 -0.866 0.3827 0 -0.9239
  [4,16,0.7654,0,-1.8478,1,0,-1.732,0.5,0,-0.866,0.3827,0,-0.9239],
// 4 16 1 0 -1.732 1.2176 0 -1.5868 0.6088 0 -0.7934 0.5 0 -0.866
  [4,16,1,0,-1.732,1.2176,0,-1.5868,0.6088,0,-0.7934,0.5,0,-0.866],
// 4 16 1.2176 0 -1.5868 1.4142 0 -1.4142 0.7071 0 -0.7071 0.6088 0 -0.7934
  [4,16,1.2176,0,-1.5868,1.4142,0,-1.4142,0.7071,0,-0.7071,0.6088,0,-0.7934],
// 4 16 1.4142 0 -1.4142 1.5868 0 -1.2176 0.7934 0 -0.6088 0.7071 0 -0.7071
  [4,16,1.4142,0,-1.4142,1.5868,0,-1.2176,0.7934,0,-0.6088,0.7071,0,-0.7071],
// 4 16 1.5868 0 -1.2176 1.732 0 -1 0.866 0 -0.5 0.7934 0 -0.6088
  [4,16,1.5868,0,-1.2176,1.732,0,-1,0.866,0,-0.5,0.7934,0,-0.6088],
// 4 16 1.732 0 -1 1.8478 0 -0.7654 0.9239 0 -0.3827 0.866 0 -0.5
  [4,16,1.732,0,-1,1.8478,0,-0.7654,0.9239,0,-0.3827,0.866,0,-0.5],
// 4 16 1.8478 0 -0.7654 1.9318 0 -0.5176 0.9659 0 -0.2588 0.9239 0 -0.3827
  [4,16,1.8478,0,-0.7654,1.9318,0,-0.5176,0.9659,0,-0.2588,0.9239,0,-0.3827],
// 4 16 1.9318 0 -0.5176 1.9828 0 -0.261 0.9914 0 -0.1305 0.9659 0 -0.2588
  [4,16,1.9318,0,-0.5176,1.9828,0,-0.261,0.9914,0,-0.1305,0.9659,0,-0.2588],
// 4 16 1.9828 0 -0.261 2 0 0 1 0 0 0.9914 0 -0.1305
  [4,16,1.9828,0,-0.261,2,0,0,1,0,0,0.9914,0,-0.1305],
];
module ldraw_lib__48__4_4ring1(step=0, col=false, unit=2/5, alt=false, line=0.2, solid=!$preview)
    makepoly(ldraw_lib__48__4_4ring1(), step=step, col=col, unit=unit, alt=alt, line=line, solid=solid);
ldraw_lib__48__4_4ring1(line=0.2);
// file: ../p/48/4-4disc.scad
use <../../lib.scad>
function ldraw_lib__48__4_4disc() = [
// 0 Hi-Res Disc 1.0
// 0 Name: 48\4-4disc.dat
// 0 Author: Miklos Hosszu [hmick]
// 0 !LDRAW_ORG 48_Primitive UPDATE 2012-02
// 0 !LICENSE Licensed under CC BY 2.0 and CC BY 4.0 : see CAreadme.txt
// 
// 0 BFC CERTIFY CCW
  [0,"BFC","CERTIFY"],
  [0,"BFC","CCW"],
// 
// 0 !HISTORY 2004-11-06 [PTadmin] Official Update 2004-04
// 0 !HISTORY 2007-06-24 [PTadmin] Header formatted for Contributor Agreement
// 0 !HISTORY 2008-07-01 [PTadmin] Official Update 2008-01
// 0 !HISTORY 2012-02-27 [Philo] Changed to CCW
// 0 !HISTORY 2012-08-09 [PTadmin] Official Update 2012-02
// 
// 
// 3 16 1 0 0 0.9914 0 0.1305 0 0 0
  [3,16,1,0,0,0.9914,0,0.1305,0,0,0],
// 3 16 0.9914 0 0.1305 0.9659 0 0.2588 0 0 0
  [3,16,0.9914,0,0.1305,0.9659,0,0.2588,0,0,0],
// 3 16 0.9659 0 0.2588 0.9239 0 0.3827 0 0 0
  [3,16,0.9659,0,0.2588,0.9239,0,0.3827,0,0,0],
// 3 16 0.9239 0 0.3827 0.866 0 0.5 0 0 0
  [3,16,0.9239,0,0.3827,0.866,0,0.5,0,0,0],
// 3 16 0.866 0 0.5 0.7934 0 0.6088 0 0 0
  [3,16,0.866,0,0.5,0.7934,0,0.6088,0,0,0],
// 3 16 0.7934 0 0.6088 0.7071 0 0.7071 0 0 0
  [3,16,0.7934,0,0.6088,0.7071,0,0.7071,0,0,0],
// 3 16 0.7071 0 0.7071 0.6088 0 0.7934 0 0 0
  [3,16,0.7071,0,0.7071,0.6088,0,0.7934,0,0,0],
// 3 16 0.6088 0 0.7934 0.5 0 0.866 0 0 0
  [3,16,0.6088,0,0.7934,0.5,0,0.866,0,0,0],
// 3 16 0.5 0 0.866 0.3827 0 0.9239 0 0 0
  [3,16,0.5,0,0.866,0.3827,0,0.9239,0,0,0],
// 3 16 0.3827 0 0.9239 0.2588 0 0.9659 0 0 0
  [3,16,0.3827,0,0.9239,0.2588,0,0.9659,0,0,0],
// 3 16 0.2588 0 0.9659 0.1305 0 0.9914 0 0 0
  [3,16,0.2588,0,0.9659,0.1305,0,0.9914,0,0,0],
// 3 16 0.1305 0 0.9914 0 0 1 0 0 0
  [3,16,0.1305,0,0.9914,0,0,1,0,0,0],
// 3 16 0 0 1 -0.1305 0 0.9914 0 0 0
  [3,16,0,0,1,-0.1305,0,0.9914,0,0,0],
// 3 16 -0.1305 0 0.9914 -0.2588 0 0.9659 0 0 0
  [3,16,-0.1305,0,0.9914,-0.2588,0,0.9659,0,0,0],
// 3 16 -0.2588 0 0.9659 -0.3827 0 0.9239 0 0 0
  [3,16,-0.2588,0,0.9659,-0.3827,0,0.9239,0,0,0],
// 3 16 -0.3827 0 0.9239 -0.5 0 0.866 0 0 0
  [3,16,-0.3827,0,0.9239,-0.5,0,0.866,0,0,0],
// 3 16 -0.5 0 0.866 -0.6088 0 0.7934 0 0 0
  [3,16,-0.5,0,0.866,-0.6088,0,0.7934,0,0,0],
// 3 16 -0.6088 0 0.7934 -0.7071 0 0.7071 0 0 0
  [3,16,-0.6088,0,0.7934,-0.7071,0,0.7071,0,0,0],
// 3 16 -0.7071 0 0.7071 -0.7934 0 0.6088 0 0 0
  [3,16,-0.7071,0,0.7071,-0.7934,0,0.6088,0,0,0],
// 3 16 -0.7934 0 0.6088 -0.866 0 0.5 0 0 0
  [3,16,-0.7934,0,0.6088,-0.866,0,0.5,0,0,0],
// 3 16 -0.866 0 0.5 -0.9239 0 0.3827 0 0 0
  [3,16,-0.866,0,0.5,-0.9239,0,0.3827,0,0,0],
// 3 16 -0.9239 0 0.3827 -0.9659 0 0.2588 0 0 0
  [3,16,-0.9239,0,0.3827,-0.9659,0,0.2588,0,0,0],
// 3 16 -0.9659 0 0.2588 -0.9914 0 0.1305 0 0 0
  [3,16,-0.9659,0,0.2588,-0.9914,0,0.1305,0,0,0],
// 3 16 -0.9914 0 0.1305 -1 0 0 0 0 0
  [3,16,-0.9914,0,0.1305,-1,0,0,0,0,0],
// 3 16 -1 0 0 -0.9914 0 -0.1305 0 0 0
  [3,16,-1,0,0,-0.9914,0,-0.1305,0,0,0],
// 3 16 -0.9914 0 -0.1305 -0.9659 0 -0.2588 0 0 0
  [3,16,-0.9914,0,-0.1305,-0.9659,0,-0.2588,0,0,0],
// 3 16 -0.9659 0 -0.2588 -0.9239 0 -0.3827 0 0 0
  [3,16,-0.9659,0,-0.2588,-0.9239,0,-0.3827,0,0,0],
// 3 16 -0.9239 0 -0.3827 -0.866 0 -0.5 0 0 0
  [3,16,-0.9239,0,-0.3827,-0.866,0,-0.5,0,0,0],
// 3 16 -0.866 0 -0.5 -0.7934 0 -0.6088 0 0 0
  [3,16,-0.866,0,-0.5,-0.7934,0,-0.6088,0,0,0],
// 3 16 -0.7934 0 -0.6088 -0.7071 0 -0.7071 0 0 0
  [3,16,-0.7934,0,-0.6088,-0.7071,0,-0.7071,0,0,0],
// 3 16 -0.7071 0 -0.7071 -0.6088 0 -0.7934 0 0 0
  [3,16,-0.7071,0,-0.7071,-0.6088,0,-0.7934,0,0,0],
// 3 16 -0.6088 0 -0.7934 -0.5 0 -0.866 0 0 0
  [3,16,-0.6088,0,-0.7934,-0.5,0,-0.866,0,0,0],
// 3 16 -0.5 0 -0.866 -0.3827 0 -0.9239 0 0 0
  [3,16,-0.5,0,-0.866,-0.3827,0,-0.9239,0,0,0],
// 3 16 -0.3827 0 -0.9239 -0.2588 0 -0.9659 0 0 0
  [3,16,-0.3827,0,-0.9239,-0.2588,0,-0.9659,0,0,0],
// 3 16 -0.2588 0 -0.9659 -0.1305 0 -0.9914 0 0 0
  [3,16,-0.2588,0,-0.9659,-0.1305,0,-0.9914,0,0,0],
// 3 16 -0.1305 0 -0.9914 0 0 -1 0 0 0
  [3,16,-0.1305,0,-0.9914,0,0,-1,0,0,0],
// 3 16 0 0 -1 0.1305 0 -0.9914 0 0 0
  [3,16,0,0,-1,0.1305,0,-0.9914,0,0,0],
// 3 16 0.1305 0 -0.9914 0.2588 0 -0.9659 0 0 0
  [3,16,0.1305,0,-0.9914,0.2588,0,-0.9659,0,0,0],
// 3 16 0.2588 0 -0.9659 0.3827 0 -0.9239 0 0 0
  [3,16,0.2588,0,-0.9659,0.3827,0,-0.9239,0,0,0],
// 3 16 0.3827 0 -0.9239 0.5 0 -0.866 0 0 0
  [3,16,0.3827,0,-0.9239,0.5,0,-0.866,0,0,0],
// 3 16 0.5 0 -0.866 0.6088 0 -0.7934 0 0 0
  [3,16,0.5,0,-0.866,0.6088,0,-0.7934,0,0,0],
// 3 16 0.6088 0 -0.7934 0.7071 0 -0.7071 0 0 0
  [3,16,0.6088,0,-0.7934,0.7071,0,-0.7071,0,0,0],
// 3 16 0.7071 0 -0.7071 0.7934 0 -0.6088 0 0 0
  [3,16,0.7071,0,-0.7071,0.7934,0,-0.6088,0,0,0],
// 3 16 0.7934 0 -0.6088 0.866 0 -0.5 0 0 0
  [3,16,0.7934,0,-0.6088,0.866,0,-0.5,0,0,0],
// 3 16 0.866 0 -0.5 0.9239 0 -0.3827 0 0 0
  [3,16,0.866,0,-0.5,0.9239,0,-0.3827,0,0,0],
// 3 16 0.9239 0 -0.3827 0.9659 0 -0.2588 0 0 0
  [3,16,0.9239,0,-0.3827,0.9659,0,-0.2588,0,0,0],
// 3 16 0.9659 0 -0.2588 0.9914 0 -0.1305 0 0 0
  [3,16,0.9659,0,-0.2588,0.9914,0,-0.1305,0,0,0],
// 3 16 0.9914 0 -0.1305 1 0 0 0 0 0
  [3,16,0.9914,0,-0.1305,1,0,0,0,0,0],
];
module ldraw_lib__48__4_4disc(step=0, col=false, unit=2/5, alt=false, line=0.2, solid=!$preview)
    makepoly(ldraw_lib__48__4_4disc(), step=step, col=col, unit=unit, alt=alt, line=line, solid=solid);
ldraw_lib__48__4_4disc(line=0.2);
// file: ../p/48/4-4cylc3.scad
use <../../lib.scad>
use <4-4cyli.scad>
use <4-4disc.scad>
function ldraw_lib__48__4_4cylc3() = [
// 0 Hi-Res Cylinder Closed 1.0 without Top or Bottom Edge Lines
// 0 Name: 48\4-4cylc3.dat
// 0 Author: Chris Dee [cwdee]
// 0 !LDRAW_ORG 48_Primitive UPDATE 2017-01
// 0 !LICENSE Licensed under CC BY 4.0 : see CAreadme.txt
// 
// 0 BFC CERTIFY CCW
  [0,"BFC","CERTIFY"],
  [0,"BFC","CCW"],
// 
// 0 !HISTORY 2017-12-30 [PTadmin] Official Update 2017-01
// 
// 
// 1 16 0 0 0 1 0 0 0 1 0 0 0 1 48\4-4disc.dat
  [1,16,0,0,0,1,0,0,0,1,0,0,0,1, ldraw_lib__48__4_4disc()],
// 1 16 0 0 0 1 0 0 0 1 0 0 0 1 48\4-4cyli.dat
  [1,16,0,0,0,1,0,0,0,1,0,0,0,1, ldraw_lib__48__4_4cyli()],
// 0
];
module ldraw_lib__48__4_4cylc3(step=0, col=false, unit=2/5, alt=false, line=0.2, solid=!$preview)
    makepoly(ldraw_lib__48__4_4cylc3(), step=step, col=col, unit=unit, alt=alt, line=line, solid=solid);
ldraw_lib__48__4_4cylc3(line=0.2);
// main file
use <../lib.scad>
use <../p/48/4-4cylc3.scad>
use <../p/48/4-4disc.scad>
use <../p/48/4-4ring1.scad>
use <../p/48/4-4ring2.scad>
function ldraw_lib__4613857a() = [
// 0 Sticker  1.6 x  1.6 Round with Red/White/DarkBlue Concentric Rings
// 0 Name: 4613857a.dat
// 0 Author: Christian Neumann [Wesley]
// 0 !LDRAW_ORG Part UPDATE 2017-01
// 0 !LICENSE Licensed under CC BY 4.0 : see CAreadme.txt
// 
// 0 !HELP place at 0 0 0 1 0 0 0 1 0 0 0 1 on 4150.dat
// 
// 0 BFC CERTIFY CCW
  [0,"BFC","CERTIFY"],
  [0,"BFC","CCW"],
// 
// 0 !KEYWORDS Pharaoh's Quest, RAF, Roundel, Royal Air Force
// 
// 0 !HISTORY 2012-08-09 [PTadmin] Official Update 2012-02
// 0 !HISTORY 2017-07-03 [cwdee] Use cylinder primitive with conditional lines
// 0 !HISTORY 2017-12-30 [PTadmin] Official Update 2017-01
// 
// 
// 1 320 0 -0.25 0 4 0 0 0 1 0 0 0 4 48\4-4disc.dat
  [1,320,0,-0.25,0,4,0,0,0,1,0,0,0,4, ldraw_lib__48__4_4disc()],
// 1 15 0 -0.25 0 4 0 0 0 1 0 0 0 4 48\4-4ring1.dat
  [1,15,0,-0.25,0,4,0,0,0,1,0,0,0,4, ldraw_lib__48__4_4ring1()],
// 1 15 0 -0.25 0 4 0 0 0 1 0 0 0 4 48\4-4ring2.dat
  [1,15,0,-0.25,0,4,0,0,0,1,0,0,0,4, ldraw_lib__48__4_4ring2()],
// 1 272 0 -0.25 0 6 0 0 0 1 0 0 0 6 48\4-4ring2.dat
  [1,272,0,-0.25,0,6,0,0,0,1,0,0,0,6, ldraw_lib__48__4_4ring2()],
// 1 272 0 0 0 18 0 0 0 -0.25 0 0 0 18 48\4-4cylc3.dat
  [1,272,0,0,0,18,0,0,0,-0.25,0,0,0,18, ldraw_lib__48__4_4cylc3()],
];
module ldraw_lib__4613857a(step=0, col=false, unit=2/5, alt=false, line=0.2, solid=!$preview)
    makepoly(ldraw_lib__4613857a(), step=step, col=col, unit=unit, alt=alt, line=line, solid=solid);
ldraw_lib__4613857a(line=0.2);
